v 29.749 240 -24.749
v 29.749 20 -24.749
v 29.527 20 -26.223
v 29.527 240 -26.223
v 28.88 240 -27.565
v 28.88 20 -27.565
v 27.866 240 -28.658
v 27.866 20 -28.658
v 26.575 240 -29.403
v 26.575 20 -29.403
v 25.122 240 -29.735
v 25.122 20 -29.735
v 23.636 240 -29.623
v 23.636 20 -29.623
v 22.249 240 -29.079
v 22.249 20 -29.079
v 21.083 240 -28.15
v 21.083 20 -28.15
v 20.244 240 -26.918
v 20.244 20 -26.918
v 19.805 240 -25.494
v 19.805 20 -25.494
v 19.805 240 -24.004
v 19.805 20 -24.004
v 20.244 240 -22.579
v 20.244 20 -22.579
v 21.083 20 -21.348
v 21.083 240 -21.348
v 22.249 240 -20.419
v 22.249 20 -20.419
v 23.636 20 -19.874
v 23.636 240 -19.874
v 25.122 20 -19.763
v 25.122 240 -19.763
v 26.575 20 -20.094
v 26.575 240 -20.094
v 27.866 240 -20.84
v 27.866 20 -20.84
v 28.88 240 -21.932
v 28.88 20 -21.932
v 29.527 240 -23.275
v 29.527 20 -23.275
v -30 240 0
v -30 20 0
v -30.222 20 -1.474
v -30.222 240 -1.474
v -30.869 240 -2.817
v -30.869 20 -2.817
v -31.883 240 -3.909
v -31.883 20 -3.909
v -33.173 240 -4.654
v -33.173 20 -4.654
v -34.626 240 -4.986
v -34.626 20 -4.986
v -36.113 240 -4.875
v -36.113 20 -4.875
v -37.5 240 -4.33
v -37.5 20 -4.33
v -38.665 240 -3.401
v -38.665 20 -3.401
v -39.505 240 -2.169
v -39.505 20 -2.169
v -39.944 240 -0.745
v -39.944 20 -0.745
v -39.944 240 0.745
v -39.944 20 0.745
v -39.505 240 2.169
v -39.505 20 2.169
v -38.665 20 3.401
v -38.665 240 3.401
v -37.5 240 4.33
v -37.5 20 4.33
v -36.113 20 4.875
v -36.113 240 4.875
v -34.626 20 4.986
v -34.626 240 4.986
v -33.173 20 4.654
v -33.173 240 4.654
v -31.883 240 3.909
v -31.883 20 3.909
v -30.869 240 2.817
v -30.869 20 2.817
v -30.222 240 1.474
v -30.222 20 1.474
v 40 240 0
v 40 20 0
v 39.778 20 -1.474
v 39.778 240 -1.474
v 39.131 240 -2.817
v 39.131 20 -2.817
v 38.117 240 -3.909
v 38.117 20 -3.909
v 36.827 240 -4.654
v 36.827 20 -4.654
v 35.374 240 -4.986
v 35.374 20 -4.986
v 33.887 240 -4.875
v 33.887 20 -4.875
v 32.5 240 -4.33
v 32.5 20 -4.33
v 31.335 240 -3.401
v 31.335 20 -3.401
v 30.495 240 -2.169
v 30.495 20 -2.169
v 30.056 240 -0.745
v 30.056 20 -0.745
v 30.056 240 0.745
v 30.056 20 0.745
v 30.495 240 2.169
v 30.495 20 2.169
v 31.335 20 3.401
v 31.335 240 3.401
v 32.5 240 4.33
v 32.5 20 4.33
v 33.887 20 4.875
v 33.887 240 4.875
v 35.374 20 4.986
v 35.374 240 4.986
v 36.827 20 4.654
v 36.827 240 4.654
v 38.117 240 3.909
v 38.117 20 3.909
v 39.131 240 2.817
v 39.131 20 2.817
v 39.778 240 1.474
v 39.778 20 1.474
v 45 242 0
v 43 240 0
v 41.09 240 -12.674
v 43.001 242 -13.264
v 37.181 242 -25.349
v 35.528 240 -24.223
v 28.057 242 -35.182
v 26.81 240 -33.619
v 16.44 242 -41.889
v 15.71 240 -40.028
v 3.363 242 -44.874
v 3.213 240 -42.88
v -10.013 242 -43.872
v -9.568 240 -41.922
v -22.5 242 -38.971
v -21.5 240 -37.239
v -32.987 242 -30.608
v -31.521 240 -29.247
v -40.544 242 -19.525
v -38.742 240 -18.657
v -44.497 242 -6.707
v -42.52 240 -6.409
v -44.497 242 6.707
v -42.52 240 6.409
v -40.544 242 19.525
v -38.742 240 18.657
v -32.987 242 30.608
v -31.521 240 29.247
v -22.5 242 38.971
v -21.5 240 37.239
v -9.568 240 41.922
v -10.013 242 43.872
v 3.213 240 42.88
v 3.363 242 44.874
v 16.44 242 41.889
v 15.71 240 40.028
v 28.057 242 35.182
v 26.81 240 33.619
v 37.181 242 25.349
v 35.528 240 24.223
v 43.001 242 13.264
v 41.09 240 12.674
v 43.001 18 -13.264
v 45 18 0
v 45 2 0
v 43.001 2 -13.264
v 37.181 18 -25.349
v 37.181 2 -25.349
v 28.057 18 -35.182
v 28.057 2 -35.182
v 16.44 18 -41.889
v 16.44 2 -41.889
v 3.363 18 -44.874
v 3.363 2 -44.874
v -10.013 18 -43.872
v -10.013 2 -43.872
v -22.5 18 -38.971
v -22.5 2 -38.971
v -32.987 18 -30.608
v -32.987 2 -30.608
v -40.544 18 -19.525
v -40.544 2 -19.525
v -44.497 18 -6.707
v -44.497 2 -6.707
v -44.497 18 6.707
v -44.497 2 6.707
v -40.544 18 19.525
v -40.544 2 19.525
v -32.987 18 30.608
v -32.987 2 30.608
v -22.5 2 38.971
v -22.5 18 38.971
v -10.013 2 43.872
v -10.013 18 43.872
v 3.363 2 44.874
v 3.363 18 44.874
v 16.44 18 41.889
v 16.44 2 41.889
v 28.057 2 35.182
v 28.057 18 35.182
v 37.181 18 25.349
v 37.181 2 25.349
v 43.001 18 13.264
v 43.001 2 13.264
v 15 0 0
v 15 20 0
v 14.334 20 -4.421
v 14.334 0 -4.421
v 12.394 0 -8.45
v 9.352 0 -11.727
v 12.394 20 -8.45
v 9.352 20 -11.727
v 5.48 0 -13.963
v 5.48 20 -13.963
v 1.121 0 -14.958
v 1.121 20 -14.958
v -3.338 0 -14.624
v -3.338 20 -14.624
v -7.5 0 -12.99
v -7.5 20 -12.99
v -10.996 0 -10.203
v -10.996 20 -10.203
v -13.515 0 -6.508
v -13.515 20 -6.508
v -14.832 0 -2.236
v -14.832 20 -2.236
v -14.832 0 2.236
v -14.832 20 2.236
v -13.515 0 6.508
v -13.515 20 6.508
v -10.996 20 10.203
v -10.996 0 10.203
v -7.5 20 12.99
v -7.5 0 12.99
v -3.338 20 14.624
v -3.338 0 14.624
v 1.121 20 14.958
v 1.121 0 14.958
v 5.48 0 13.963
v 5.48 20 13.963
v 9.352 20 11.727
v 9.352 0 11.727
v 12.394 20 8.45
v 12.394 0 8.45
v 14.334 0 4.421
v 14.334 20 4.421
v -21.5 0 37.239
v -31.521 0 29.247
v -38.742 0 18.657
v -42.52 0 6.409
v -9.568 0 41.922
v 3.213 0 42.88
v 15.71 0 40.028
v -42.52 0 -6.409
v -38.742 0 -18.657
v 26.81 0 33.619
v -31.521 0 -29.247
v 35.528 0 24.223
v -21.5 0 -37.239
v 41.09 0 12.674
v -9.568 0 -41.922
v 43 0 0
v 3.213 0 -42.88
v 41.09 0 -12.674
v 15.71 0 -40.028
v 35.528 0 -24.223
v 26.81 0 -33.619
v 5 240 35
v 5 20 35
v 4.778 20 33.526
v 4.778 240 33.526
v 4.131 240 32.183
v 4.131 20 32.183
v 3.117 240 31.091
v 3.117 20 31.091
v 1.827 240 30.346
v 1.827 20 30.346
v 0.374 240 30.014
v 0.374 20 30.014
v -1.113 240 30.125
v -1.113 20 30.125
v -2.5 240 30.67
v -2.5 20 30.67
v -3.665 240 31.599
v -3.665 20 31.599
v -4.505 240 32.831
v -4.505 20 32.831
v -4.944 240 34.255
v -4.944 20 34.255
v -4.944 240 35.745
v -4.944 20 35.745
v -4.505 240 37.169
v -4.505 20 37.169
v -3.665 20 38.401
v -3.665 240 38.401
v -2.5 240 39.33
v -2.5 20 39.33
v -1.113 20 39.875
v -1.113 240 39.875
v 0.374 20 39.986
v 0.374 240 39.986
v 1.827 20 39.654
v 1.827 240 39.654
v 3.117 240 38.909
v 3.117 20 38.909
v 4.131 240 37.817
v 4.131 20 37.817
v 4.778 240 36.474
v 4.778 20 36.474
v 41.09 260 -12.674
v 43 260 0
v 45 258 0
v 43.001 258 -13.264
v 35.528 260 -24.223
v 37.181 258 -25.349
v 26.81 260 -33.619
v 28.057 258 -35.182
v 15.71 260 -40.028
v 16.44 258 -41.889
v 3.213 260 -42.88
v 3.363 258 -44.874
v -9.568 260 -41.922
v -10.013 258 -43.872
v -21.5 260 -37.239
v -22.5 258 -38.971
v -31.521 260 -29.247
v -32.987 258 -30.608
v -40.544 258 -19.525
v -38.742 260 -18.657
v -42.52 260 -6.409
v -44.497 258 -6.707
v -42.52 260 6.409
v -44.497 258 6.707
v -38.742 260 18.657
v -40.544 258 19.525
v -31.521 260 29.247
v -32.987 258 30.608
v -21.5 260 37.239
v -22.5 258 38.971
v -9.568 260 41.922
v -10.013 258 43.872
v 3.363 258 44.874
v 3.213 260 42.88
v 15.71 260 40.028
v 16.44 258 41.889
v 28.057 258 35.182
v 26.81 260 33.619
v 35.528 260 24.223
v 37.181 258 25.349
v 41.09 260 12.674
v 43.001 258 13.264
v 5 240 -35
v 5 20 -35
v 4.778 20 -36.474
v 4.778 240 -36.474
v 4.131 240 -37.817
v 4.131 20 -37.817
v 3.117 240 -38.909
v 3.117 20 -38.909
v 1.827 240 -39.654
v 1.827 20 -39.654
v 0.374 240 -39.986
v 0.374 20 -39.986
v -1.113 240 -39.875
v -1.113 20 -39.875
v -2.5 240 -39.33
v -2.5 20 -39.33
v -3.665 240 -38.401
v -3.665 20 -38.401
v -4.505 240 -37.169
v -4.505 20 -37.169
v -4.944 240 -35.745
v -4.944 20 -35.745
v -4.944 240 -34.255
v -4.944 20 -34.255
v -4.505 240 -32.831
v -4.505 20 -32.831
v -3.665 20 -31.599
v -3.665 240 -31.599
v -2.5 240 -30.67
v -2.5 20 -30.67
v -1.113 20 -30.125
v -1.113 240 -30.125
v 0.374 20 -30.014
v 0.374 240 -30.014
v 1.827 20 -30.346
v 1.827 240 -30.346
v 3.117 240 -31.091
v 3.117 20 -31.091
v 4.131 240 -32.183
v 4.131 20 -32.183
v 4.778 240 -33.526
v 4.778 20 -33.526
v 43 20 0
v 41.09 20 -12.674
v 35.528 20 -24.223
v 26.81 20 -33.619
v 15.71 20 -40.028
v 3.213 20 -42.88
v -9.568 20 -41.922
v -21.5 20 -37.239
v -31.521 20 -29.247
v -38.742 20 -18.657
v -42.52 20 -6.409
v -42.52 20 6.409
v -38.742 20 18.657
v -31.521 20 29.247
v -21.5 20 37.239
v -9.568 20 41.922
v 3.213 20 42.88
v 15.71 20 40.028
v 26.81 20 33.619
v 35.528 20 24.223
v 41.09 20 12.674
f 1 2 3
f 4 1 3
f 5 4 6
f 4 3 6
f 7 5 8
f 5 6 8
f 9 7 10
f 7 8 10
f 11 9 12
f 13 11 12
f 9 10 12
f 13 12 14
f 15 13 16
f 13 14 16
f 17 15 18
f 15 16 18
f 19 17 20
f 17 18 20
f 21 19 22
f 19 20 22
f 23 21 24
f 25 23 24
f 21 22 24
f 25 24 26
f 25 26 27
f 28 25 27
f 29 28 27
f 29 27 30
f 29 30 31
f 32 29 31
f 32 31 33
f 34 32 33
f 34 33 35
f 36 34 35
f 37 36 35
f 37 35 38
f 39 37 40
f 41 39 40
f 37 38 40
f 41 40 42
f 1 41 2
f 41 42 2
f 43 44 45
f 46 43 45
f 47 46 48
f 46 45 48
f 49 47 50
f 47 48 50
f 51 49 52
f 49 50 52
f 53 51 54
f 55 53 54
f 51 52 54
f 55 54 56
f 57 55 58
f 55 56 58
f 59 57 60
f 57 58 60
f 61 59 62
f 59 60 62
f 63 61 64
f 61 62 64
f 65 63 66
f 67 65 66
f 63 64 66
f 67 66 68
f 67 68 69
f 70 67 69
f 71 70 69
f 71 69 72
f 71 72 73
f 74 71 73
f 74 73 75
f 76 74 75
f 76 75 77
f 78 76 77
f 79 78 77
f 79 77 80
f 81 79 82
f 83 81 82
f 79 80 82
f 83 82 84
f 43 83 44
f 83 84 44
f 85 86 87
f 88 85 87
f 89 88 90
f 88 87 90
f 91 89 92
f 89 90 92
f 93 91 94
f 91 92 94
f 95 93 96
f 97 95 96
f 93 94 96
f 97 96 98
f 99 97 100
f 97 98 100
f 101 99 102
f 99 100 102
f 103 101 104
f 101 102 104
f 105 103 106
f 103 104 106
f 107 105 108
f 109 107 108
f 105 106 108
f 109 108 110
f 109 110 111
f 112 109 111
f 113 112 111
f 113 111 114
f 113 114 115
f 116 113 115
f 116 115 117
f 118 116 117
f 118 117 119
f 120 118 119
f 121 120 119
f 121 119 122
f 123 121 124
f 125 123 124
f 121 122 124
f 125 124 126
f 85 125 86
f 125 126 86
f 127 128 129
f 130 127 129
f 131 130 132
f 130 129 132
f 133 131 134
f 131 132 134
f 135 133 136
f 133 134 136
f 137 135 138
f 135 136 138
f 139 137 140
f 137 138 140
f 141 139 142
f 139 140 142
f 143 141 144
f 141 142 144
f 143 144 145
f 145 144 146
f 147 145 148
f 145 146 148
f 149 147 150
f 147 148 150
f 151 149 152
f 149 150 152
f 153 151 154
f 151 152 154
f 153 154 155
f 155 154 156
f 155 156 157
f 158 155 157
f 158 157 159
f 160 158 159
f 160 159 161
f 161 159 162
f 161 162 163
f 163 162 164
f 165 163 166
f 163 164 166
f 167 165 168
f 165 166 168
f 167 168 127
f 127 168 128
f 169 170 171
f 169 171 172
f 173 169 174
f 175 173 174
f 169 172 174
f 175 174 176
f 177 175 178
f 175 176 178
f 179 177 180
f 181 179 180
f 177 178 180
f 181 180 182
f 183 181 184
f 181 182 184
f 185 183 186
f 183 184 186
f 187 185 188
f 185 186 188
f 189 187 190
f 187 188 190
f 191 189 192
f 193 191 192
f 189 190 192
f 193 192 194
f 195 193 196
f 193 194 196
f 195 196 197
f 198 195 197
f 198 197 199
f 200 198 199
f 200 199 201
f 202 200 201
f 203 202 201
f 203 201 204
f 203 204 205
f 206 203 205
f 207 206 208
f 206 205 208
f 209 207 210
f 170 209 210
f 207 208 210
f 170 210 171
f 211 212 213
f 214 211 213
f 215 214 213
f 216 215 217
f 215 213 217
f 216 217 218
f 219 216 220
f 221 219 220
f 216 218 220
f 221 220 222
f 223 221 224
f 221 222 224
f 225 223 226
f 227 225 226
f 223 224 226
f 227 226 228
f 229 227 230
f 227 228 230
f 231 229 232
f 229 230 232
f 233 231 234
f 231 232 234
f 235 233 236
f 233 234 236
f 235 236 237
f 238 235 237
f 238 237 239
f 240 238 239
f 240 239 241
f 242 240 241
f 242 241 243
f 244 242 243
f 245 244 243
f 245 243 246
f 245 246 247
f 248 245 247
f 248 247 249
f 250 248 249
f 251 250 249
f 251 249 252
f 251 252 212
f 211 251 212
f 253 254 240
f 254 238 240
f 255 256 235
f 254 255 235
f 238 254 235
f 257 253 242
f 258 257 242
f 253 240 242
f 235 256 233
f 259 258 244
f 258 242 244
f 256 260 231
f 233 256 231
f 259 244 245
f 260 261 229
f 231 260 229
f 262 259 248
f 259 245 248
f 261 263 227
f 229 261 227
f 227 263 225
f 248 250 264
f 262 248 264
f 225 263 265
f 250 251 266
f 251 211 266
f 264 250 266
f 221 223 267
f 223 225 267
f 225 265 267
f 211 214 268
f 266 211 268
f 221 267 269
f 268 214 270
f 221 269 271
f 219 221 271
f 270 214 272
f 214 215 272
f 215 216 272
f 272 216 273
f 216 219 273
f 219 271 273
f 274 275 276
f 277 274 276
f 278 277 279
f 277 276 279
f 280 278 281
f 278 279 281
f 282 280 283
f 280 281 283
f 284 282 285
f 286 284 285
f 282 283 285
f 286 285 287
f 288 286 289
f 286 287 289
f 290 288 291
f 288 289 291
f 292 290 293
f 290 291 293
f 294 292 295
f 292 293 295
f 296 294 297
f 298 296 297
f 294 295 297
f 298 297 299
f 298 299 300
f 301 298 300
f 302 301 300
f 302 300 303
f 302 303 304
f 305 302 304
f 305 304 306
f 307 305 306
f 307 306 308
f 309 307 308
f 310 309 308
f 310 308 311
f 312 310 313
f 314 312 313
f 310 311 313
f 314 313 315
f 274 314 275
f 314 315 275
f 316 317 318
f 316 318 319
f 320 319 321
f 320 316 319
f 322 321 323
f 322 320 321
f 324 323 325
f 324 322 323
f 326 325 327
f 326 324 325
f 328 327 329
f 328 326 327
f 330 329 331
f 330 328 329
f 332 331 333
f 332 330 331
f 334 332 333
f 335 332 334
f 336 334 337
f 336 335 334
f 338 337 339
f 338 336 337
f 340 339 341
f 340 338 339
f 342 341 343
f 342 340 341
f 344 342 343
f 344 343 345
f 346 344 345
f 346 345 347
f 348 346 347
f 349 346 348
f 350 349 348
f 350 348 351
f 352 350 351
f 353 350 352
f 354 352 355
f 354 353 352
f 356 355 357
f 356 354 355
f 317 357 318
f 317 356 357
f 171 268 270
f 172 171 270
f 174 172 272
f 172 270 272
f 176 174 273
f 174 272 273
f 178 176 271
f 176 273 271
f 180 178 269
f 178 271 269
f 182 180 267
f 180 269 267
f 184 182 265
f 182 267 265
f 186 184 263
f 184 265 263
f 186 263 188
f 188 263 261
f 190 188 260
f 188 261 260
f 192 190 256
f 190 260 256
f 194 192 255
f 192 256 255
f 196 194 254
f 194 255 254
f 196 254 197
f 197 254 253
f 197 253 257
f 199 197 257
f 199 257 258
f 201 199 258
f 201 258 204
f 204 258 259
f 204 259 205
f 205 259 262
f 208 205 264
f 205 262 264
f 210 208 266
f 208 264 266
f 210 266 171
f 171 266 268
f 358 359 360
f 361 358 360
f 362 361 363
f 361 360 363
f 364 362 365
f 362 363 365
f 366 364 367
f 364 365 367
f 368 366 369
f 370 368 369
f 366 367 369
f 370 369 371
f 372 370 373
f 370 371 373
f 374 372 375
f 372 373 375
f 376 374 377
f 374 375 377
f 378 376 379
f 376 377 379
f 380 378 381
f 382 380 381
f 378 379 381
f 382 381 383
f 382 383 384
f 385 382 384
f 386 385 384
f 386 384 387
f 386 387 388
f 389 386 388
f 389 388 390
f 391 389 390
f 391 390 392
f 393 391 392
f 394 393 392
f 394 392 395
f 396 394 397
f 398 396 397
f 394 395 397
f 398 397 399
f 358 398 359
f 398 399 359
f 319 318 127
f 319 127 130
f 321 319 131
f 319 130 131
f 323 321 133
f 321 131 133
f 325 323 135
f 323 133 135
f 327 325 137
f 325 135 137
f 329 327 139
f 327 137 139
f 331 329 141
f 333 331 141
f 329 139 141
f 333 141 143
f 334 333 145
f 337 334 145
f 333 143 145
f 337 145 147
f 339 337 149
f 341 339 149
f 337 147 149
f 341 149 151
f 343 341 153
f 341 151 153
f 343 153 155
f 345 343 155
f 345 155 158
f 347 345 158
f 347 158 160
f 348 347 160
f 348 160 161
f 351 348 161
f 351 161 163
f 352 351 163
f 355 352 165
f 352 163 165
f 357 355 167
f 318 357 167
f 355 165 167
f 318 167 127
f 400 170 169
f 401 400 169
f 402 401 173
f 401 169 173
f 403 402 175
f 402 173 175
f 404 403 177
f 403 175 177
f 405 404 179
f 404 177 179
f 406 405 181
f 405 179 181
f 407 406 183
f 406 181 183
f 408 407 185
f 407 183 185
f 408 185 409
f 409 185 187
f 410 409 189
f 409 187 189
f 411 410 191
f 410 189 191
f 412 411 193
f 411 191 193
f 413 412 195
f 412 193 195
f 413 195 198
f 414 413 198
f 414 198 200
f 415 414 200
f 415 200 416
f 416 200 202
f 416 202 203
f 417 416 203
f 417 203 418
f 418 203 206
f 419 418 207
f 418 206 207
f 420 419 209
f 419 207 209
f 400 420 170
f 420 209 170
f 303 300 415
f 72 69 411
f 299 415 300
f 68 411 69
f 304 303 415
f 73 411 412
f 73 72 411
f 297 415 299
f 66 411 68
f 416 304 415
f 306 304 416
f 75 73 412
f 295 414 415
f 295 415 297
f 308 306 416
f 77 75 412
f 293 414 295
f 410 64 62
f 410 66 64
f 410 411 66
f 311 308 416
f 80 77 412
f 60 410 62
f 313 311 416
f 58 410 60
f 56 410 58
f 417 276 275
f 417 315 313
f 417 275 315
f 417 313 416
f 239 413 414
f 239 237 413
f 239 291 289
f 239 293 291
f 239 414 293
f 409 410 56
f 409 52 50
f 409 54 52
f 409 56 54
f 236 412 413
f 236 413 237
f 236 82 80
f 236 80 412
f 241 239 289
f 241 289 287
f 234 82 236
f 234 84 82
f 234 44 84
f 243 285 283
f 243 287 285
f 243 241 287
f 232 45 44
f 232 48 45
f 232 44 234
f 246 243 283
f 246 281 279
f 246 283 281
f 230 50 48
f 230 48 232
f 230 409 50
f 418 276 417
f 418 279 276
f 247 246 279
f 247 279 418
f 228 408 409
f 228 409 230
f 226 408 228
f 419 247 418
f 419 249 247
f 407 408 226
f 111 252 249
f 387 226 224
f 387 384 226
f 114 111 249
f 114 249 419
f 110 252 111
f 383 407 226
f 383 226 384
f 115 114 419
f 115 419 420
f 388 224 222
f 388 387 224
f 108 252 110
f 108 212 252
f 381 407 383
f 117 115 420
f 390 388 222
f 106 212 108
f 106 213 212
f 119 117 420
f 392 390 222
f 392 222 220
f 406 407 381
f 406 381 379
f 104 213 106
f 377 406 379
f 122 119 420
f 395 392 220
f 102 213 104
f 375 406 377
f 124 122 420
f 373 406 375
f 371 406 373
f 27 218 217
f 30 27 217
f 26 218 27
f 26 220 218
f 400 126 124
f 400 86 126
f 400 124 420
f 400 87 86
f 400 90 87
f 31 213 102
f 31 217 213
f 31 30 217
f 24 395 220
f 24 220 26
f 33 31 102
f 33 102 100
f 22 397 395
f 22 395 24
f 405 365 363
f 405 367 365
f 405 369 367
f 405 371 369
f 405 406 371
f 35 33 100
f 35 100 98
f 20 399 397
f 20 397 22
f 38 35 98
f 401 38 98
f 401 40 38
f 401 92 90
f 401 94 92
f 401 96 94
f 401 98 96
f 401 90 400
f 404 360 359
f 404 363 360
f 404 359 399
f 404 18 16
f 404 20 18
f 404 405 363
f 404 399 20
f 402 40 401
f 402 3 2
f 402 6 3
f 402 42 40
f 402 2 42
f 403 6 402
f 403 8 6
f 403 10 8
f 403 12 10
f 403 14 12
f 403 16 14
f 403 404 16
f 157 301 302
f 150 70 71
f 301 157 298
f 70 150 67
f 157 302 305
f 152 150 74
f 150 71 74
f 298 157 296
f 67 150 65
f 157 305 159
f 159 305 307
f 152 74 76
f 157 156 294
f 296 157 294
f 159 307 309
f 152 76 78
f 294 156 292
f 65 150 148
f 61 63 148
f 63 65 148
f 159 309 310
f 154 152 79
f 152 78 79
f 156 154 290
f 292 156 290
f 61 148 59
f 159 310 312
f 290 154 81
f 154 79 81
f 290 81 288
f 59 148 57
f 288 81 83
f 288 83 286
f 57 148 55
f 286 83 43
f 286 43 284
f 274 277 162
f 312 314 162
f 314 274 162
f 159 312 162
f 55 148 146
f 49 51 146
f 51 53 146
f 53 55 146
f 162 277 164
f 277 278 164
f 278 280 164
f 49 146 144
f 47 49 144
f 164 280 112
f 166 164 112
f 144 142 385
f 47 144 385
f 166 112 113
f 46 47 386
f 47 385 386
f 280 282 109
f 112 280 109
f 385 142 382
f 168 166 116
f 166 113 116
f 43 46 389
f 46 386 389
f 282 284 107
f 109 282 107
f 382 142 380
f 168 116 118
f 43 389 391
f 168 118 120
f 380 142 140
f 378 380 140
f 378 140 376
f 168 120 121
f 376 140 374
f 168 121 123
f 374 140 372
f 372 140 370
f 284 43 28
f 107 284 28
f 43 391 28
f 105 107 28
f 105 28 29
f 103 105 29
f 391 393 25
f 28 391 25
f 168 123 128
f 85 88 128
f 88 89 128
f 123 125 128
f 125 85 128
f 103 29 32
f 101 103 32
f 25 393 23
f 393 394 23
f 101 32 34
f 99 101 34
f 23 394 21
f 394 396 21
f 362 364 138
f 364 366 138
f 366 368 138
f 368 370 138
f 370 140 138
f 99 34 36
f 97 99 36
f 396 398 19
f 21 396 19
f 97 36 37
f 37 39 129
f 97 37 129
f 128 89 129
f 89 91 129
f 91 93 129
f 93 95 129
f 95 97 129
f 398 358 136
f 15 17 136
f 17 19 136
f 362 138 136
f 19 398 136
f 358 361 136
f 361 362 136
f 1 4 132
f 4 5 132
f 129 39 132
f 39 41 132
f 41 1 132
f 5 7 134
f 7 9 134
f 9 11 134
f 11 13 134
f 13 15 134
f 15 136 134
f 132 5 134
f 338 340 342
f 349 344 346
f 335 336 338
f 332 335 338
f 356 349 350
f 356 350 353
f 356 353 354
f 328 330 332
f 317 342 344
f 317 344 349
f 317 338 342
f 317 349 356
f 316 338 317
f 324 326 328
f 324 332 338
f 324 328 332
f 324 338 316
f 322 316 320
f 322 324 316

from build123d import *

# Parameters (mm, degrees)
SKETCH1_R           = 45
BOSS_EXTRUDE1_DEPTH = 20
SKETCH2_R           = 15
CUT_EXTRUDE1_DEPTH  = 21
SKETCH3_R           = 5
BOSS_EXTRUDE2_DEPTH = 220
SKETCH4_R           = 45
BOSS_EXTRUDE3_DEPTH = 20
CHAMFER1_SIZE       = 2


with BuildPart() as part:
    # Sketch1 → Boss-Extrude1 (new body)
    with BuildSketch(Plane(origin=(0, 0, 0), x_dir=(1, 0, 0), z_dir=(0, 1, 0))):
        Circle(SKETCH1_R)
    extrude(amount=BOSS_EXTRUDE1_DEPTH)

    # Sketch2 → Cut-Extrude1 (cut, through all)
    with BuildSketch(Plane(origin=(0, 20, 0), x_dir=(1, 0, 0), z_dir=(0, 1, 0))):
        Circle(SKETCH2_R)
    extrude(amount=-CUT_EXTRUDE1_DEPTH, mode=Mode.SUBTRACT)

    # Sketch3 → Boss-Extrude2 (add)
    with BuildSketch(Plane(origin=(0, 20, 0), x_dir=(1, 0, 0), z_dir=(0, 1, 0))):
        with Locations((35, 0)):
            Circle(SKETCH3_R)
        with Locations((0, -35)):
            Circle(SKETCH3_R)
        with Locations((-35, 0)):
            Circle(SKETCH3_R)
        with Locations((0, 35)):
            Circle(SKETCH3_R)
        with Locations((24.748737342, 24.748737342)):
            Circle(SKETCH3_R)
    extrude(amount=BOSS_EXTRUDE2_DEPTH)

    # Sketch4 → Boss-Extrude3 (add)
    with BuildSketch(Plane(origin=(0, 240, 0), x_dir=(1, 0, 0), z_dir=(0, 1, 0))):
        Circle(SKETCH4_R)
    extrude(amount=BOSS_EXTRUDE3_DEPTH)

    # Chamfer1
    chamfer1_edges = [part.edges().sort_by_distance(p)[0] for p in [
        (-45, 0, 0),
        (-45, 240, 0),
        (-45, 260, 0),
        (-45, 20, 0),
    ]]
    chamfer(chamfer1_edges, length=CHAMFER1_SIZE)


solid = part.part
